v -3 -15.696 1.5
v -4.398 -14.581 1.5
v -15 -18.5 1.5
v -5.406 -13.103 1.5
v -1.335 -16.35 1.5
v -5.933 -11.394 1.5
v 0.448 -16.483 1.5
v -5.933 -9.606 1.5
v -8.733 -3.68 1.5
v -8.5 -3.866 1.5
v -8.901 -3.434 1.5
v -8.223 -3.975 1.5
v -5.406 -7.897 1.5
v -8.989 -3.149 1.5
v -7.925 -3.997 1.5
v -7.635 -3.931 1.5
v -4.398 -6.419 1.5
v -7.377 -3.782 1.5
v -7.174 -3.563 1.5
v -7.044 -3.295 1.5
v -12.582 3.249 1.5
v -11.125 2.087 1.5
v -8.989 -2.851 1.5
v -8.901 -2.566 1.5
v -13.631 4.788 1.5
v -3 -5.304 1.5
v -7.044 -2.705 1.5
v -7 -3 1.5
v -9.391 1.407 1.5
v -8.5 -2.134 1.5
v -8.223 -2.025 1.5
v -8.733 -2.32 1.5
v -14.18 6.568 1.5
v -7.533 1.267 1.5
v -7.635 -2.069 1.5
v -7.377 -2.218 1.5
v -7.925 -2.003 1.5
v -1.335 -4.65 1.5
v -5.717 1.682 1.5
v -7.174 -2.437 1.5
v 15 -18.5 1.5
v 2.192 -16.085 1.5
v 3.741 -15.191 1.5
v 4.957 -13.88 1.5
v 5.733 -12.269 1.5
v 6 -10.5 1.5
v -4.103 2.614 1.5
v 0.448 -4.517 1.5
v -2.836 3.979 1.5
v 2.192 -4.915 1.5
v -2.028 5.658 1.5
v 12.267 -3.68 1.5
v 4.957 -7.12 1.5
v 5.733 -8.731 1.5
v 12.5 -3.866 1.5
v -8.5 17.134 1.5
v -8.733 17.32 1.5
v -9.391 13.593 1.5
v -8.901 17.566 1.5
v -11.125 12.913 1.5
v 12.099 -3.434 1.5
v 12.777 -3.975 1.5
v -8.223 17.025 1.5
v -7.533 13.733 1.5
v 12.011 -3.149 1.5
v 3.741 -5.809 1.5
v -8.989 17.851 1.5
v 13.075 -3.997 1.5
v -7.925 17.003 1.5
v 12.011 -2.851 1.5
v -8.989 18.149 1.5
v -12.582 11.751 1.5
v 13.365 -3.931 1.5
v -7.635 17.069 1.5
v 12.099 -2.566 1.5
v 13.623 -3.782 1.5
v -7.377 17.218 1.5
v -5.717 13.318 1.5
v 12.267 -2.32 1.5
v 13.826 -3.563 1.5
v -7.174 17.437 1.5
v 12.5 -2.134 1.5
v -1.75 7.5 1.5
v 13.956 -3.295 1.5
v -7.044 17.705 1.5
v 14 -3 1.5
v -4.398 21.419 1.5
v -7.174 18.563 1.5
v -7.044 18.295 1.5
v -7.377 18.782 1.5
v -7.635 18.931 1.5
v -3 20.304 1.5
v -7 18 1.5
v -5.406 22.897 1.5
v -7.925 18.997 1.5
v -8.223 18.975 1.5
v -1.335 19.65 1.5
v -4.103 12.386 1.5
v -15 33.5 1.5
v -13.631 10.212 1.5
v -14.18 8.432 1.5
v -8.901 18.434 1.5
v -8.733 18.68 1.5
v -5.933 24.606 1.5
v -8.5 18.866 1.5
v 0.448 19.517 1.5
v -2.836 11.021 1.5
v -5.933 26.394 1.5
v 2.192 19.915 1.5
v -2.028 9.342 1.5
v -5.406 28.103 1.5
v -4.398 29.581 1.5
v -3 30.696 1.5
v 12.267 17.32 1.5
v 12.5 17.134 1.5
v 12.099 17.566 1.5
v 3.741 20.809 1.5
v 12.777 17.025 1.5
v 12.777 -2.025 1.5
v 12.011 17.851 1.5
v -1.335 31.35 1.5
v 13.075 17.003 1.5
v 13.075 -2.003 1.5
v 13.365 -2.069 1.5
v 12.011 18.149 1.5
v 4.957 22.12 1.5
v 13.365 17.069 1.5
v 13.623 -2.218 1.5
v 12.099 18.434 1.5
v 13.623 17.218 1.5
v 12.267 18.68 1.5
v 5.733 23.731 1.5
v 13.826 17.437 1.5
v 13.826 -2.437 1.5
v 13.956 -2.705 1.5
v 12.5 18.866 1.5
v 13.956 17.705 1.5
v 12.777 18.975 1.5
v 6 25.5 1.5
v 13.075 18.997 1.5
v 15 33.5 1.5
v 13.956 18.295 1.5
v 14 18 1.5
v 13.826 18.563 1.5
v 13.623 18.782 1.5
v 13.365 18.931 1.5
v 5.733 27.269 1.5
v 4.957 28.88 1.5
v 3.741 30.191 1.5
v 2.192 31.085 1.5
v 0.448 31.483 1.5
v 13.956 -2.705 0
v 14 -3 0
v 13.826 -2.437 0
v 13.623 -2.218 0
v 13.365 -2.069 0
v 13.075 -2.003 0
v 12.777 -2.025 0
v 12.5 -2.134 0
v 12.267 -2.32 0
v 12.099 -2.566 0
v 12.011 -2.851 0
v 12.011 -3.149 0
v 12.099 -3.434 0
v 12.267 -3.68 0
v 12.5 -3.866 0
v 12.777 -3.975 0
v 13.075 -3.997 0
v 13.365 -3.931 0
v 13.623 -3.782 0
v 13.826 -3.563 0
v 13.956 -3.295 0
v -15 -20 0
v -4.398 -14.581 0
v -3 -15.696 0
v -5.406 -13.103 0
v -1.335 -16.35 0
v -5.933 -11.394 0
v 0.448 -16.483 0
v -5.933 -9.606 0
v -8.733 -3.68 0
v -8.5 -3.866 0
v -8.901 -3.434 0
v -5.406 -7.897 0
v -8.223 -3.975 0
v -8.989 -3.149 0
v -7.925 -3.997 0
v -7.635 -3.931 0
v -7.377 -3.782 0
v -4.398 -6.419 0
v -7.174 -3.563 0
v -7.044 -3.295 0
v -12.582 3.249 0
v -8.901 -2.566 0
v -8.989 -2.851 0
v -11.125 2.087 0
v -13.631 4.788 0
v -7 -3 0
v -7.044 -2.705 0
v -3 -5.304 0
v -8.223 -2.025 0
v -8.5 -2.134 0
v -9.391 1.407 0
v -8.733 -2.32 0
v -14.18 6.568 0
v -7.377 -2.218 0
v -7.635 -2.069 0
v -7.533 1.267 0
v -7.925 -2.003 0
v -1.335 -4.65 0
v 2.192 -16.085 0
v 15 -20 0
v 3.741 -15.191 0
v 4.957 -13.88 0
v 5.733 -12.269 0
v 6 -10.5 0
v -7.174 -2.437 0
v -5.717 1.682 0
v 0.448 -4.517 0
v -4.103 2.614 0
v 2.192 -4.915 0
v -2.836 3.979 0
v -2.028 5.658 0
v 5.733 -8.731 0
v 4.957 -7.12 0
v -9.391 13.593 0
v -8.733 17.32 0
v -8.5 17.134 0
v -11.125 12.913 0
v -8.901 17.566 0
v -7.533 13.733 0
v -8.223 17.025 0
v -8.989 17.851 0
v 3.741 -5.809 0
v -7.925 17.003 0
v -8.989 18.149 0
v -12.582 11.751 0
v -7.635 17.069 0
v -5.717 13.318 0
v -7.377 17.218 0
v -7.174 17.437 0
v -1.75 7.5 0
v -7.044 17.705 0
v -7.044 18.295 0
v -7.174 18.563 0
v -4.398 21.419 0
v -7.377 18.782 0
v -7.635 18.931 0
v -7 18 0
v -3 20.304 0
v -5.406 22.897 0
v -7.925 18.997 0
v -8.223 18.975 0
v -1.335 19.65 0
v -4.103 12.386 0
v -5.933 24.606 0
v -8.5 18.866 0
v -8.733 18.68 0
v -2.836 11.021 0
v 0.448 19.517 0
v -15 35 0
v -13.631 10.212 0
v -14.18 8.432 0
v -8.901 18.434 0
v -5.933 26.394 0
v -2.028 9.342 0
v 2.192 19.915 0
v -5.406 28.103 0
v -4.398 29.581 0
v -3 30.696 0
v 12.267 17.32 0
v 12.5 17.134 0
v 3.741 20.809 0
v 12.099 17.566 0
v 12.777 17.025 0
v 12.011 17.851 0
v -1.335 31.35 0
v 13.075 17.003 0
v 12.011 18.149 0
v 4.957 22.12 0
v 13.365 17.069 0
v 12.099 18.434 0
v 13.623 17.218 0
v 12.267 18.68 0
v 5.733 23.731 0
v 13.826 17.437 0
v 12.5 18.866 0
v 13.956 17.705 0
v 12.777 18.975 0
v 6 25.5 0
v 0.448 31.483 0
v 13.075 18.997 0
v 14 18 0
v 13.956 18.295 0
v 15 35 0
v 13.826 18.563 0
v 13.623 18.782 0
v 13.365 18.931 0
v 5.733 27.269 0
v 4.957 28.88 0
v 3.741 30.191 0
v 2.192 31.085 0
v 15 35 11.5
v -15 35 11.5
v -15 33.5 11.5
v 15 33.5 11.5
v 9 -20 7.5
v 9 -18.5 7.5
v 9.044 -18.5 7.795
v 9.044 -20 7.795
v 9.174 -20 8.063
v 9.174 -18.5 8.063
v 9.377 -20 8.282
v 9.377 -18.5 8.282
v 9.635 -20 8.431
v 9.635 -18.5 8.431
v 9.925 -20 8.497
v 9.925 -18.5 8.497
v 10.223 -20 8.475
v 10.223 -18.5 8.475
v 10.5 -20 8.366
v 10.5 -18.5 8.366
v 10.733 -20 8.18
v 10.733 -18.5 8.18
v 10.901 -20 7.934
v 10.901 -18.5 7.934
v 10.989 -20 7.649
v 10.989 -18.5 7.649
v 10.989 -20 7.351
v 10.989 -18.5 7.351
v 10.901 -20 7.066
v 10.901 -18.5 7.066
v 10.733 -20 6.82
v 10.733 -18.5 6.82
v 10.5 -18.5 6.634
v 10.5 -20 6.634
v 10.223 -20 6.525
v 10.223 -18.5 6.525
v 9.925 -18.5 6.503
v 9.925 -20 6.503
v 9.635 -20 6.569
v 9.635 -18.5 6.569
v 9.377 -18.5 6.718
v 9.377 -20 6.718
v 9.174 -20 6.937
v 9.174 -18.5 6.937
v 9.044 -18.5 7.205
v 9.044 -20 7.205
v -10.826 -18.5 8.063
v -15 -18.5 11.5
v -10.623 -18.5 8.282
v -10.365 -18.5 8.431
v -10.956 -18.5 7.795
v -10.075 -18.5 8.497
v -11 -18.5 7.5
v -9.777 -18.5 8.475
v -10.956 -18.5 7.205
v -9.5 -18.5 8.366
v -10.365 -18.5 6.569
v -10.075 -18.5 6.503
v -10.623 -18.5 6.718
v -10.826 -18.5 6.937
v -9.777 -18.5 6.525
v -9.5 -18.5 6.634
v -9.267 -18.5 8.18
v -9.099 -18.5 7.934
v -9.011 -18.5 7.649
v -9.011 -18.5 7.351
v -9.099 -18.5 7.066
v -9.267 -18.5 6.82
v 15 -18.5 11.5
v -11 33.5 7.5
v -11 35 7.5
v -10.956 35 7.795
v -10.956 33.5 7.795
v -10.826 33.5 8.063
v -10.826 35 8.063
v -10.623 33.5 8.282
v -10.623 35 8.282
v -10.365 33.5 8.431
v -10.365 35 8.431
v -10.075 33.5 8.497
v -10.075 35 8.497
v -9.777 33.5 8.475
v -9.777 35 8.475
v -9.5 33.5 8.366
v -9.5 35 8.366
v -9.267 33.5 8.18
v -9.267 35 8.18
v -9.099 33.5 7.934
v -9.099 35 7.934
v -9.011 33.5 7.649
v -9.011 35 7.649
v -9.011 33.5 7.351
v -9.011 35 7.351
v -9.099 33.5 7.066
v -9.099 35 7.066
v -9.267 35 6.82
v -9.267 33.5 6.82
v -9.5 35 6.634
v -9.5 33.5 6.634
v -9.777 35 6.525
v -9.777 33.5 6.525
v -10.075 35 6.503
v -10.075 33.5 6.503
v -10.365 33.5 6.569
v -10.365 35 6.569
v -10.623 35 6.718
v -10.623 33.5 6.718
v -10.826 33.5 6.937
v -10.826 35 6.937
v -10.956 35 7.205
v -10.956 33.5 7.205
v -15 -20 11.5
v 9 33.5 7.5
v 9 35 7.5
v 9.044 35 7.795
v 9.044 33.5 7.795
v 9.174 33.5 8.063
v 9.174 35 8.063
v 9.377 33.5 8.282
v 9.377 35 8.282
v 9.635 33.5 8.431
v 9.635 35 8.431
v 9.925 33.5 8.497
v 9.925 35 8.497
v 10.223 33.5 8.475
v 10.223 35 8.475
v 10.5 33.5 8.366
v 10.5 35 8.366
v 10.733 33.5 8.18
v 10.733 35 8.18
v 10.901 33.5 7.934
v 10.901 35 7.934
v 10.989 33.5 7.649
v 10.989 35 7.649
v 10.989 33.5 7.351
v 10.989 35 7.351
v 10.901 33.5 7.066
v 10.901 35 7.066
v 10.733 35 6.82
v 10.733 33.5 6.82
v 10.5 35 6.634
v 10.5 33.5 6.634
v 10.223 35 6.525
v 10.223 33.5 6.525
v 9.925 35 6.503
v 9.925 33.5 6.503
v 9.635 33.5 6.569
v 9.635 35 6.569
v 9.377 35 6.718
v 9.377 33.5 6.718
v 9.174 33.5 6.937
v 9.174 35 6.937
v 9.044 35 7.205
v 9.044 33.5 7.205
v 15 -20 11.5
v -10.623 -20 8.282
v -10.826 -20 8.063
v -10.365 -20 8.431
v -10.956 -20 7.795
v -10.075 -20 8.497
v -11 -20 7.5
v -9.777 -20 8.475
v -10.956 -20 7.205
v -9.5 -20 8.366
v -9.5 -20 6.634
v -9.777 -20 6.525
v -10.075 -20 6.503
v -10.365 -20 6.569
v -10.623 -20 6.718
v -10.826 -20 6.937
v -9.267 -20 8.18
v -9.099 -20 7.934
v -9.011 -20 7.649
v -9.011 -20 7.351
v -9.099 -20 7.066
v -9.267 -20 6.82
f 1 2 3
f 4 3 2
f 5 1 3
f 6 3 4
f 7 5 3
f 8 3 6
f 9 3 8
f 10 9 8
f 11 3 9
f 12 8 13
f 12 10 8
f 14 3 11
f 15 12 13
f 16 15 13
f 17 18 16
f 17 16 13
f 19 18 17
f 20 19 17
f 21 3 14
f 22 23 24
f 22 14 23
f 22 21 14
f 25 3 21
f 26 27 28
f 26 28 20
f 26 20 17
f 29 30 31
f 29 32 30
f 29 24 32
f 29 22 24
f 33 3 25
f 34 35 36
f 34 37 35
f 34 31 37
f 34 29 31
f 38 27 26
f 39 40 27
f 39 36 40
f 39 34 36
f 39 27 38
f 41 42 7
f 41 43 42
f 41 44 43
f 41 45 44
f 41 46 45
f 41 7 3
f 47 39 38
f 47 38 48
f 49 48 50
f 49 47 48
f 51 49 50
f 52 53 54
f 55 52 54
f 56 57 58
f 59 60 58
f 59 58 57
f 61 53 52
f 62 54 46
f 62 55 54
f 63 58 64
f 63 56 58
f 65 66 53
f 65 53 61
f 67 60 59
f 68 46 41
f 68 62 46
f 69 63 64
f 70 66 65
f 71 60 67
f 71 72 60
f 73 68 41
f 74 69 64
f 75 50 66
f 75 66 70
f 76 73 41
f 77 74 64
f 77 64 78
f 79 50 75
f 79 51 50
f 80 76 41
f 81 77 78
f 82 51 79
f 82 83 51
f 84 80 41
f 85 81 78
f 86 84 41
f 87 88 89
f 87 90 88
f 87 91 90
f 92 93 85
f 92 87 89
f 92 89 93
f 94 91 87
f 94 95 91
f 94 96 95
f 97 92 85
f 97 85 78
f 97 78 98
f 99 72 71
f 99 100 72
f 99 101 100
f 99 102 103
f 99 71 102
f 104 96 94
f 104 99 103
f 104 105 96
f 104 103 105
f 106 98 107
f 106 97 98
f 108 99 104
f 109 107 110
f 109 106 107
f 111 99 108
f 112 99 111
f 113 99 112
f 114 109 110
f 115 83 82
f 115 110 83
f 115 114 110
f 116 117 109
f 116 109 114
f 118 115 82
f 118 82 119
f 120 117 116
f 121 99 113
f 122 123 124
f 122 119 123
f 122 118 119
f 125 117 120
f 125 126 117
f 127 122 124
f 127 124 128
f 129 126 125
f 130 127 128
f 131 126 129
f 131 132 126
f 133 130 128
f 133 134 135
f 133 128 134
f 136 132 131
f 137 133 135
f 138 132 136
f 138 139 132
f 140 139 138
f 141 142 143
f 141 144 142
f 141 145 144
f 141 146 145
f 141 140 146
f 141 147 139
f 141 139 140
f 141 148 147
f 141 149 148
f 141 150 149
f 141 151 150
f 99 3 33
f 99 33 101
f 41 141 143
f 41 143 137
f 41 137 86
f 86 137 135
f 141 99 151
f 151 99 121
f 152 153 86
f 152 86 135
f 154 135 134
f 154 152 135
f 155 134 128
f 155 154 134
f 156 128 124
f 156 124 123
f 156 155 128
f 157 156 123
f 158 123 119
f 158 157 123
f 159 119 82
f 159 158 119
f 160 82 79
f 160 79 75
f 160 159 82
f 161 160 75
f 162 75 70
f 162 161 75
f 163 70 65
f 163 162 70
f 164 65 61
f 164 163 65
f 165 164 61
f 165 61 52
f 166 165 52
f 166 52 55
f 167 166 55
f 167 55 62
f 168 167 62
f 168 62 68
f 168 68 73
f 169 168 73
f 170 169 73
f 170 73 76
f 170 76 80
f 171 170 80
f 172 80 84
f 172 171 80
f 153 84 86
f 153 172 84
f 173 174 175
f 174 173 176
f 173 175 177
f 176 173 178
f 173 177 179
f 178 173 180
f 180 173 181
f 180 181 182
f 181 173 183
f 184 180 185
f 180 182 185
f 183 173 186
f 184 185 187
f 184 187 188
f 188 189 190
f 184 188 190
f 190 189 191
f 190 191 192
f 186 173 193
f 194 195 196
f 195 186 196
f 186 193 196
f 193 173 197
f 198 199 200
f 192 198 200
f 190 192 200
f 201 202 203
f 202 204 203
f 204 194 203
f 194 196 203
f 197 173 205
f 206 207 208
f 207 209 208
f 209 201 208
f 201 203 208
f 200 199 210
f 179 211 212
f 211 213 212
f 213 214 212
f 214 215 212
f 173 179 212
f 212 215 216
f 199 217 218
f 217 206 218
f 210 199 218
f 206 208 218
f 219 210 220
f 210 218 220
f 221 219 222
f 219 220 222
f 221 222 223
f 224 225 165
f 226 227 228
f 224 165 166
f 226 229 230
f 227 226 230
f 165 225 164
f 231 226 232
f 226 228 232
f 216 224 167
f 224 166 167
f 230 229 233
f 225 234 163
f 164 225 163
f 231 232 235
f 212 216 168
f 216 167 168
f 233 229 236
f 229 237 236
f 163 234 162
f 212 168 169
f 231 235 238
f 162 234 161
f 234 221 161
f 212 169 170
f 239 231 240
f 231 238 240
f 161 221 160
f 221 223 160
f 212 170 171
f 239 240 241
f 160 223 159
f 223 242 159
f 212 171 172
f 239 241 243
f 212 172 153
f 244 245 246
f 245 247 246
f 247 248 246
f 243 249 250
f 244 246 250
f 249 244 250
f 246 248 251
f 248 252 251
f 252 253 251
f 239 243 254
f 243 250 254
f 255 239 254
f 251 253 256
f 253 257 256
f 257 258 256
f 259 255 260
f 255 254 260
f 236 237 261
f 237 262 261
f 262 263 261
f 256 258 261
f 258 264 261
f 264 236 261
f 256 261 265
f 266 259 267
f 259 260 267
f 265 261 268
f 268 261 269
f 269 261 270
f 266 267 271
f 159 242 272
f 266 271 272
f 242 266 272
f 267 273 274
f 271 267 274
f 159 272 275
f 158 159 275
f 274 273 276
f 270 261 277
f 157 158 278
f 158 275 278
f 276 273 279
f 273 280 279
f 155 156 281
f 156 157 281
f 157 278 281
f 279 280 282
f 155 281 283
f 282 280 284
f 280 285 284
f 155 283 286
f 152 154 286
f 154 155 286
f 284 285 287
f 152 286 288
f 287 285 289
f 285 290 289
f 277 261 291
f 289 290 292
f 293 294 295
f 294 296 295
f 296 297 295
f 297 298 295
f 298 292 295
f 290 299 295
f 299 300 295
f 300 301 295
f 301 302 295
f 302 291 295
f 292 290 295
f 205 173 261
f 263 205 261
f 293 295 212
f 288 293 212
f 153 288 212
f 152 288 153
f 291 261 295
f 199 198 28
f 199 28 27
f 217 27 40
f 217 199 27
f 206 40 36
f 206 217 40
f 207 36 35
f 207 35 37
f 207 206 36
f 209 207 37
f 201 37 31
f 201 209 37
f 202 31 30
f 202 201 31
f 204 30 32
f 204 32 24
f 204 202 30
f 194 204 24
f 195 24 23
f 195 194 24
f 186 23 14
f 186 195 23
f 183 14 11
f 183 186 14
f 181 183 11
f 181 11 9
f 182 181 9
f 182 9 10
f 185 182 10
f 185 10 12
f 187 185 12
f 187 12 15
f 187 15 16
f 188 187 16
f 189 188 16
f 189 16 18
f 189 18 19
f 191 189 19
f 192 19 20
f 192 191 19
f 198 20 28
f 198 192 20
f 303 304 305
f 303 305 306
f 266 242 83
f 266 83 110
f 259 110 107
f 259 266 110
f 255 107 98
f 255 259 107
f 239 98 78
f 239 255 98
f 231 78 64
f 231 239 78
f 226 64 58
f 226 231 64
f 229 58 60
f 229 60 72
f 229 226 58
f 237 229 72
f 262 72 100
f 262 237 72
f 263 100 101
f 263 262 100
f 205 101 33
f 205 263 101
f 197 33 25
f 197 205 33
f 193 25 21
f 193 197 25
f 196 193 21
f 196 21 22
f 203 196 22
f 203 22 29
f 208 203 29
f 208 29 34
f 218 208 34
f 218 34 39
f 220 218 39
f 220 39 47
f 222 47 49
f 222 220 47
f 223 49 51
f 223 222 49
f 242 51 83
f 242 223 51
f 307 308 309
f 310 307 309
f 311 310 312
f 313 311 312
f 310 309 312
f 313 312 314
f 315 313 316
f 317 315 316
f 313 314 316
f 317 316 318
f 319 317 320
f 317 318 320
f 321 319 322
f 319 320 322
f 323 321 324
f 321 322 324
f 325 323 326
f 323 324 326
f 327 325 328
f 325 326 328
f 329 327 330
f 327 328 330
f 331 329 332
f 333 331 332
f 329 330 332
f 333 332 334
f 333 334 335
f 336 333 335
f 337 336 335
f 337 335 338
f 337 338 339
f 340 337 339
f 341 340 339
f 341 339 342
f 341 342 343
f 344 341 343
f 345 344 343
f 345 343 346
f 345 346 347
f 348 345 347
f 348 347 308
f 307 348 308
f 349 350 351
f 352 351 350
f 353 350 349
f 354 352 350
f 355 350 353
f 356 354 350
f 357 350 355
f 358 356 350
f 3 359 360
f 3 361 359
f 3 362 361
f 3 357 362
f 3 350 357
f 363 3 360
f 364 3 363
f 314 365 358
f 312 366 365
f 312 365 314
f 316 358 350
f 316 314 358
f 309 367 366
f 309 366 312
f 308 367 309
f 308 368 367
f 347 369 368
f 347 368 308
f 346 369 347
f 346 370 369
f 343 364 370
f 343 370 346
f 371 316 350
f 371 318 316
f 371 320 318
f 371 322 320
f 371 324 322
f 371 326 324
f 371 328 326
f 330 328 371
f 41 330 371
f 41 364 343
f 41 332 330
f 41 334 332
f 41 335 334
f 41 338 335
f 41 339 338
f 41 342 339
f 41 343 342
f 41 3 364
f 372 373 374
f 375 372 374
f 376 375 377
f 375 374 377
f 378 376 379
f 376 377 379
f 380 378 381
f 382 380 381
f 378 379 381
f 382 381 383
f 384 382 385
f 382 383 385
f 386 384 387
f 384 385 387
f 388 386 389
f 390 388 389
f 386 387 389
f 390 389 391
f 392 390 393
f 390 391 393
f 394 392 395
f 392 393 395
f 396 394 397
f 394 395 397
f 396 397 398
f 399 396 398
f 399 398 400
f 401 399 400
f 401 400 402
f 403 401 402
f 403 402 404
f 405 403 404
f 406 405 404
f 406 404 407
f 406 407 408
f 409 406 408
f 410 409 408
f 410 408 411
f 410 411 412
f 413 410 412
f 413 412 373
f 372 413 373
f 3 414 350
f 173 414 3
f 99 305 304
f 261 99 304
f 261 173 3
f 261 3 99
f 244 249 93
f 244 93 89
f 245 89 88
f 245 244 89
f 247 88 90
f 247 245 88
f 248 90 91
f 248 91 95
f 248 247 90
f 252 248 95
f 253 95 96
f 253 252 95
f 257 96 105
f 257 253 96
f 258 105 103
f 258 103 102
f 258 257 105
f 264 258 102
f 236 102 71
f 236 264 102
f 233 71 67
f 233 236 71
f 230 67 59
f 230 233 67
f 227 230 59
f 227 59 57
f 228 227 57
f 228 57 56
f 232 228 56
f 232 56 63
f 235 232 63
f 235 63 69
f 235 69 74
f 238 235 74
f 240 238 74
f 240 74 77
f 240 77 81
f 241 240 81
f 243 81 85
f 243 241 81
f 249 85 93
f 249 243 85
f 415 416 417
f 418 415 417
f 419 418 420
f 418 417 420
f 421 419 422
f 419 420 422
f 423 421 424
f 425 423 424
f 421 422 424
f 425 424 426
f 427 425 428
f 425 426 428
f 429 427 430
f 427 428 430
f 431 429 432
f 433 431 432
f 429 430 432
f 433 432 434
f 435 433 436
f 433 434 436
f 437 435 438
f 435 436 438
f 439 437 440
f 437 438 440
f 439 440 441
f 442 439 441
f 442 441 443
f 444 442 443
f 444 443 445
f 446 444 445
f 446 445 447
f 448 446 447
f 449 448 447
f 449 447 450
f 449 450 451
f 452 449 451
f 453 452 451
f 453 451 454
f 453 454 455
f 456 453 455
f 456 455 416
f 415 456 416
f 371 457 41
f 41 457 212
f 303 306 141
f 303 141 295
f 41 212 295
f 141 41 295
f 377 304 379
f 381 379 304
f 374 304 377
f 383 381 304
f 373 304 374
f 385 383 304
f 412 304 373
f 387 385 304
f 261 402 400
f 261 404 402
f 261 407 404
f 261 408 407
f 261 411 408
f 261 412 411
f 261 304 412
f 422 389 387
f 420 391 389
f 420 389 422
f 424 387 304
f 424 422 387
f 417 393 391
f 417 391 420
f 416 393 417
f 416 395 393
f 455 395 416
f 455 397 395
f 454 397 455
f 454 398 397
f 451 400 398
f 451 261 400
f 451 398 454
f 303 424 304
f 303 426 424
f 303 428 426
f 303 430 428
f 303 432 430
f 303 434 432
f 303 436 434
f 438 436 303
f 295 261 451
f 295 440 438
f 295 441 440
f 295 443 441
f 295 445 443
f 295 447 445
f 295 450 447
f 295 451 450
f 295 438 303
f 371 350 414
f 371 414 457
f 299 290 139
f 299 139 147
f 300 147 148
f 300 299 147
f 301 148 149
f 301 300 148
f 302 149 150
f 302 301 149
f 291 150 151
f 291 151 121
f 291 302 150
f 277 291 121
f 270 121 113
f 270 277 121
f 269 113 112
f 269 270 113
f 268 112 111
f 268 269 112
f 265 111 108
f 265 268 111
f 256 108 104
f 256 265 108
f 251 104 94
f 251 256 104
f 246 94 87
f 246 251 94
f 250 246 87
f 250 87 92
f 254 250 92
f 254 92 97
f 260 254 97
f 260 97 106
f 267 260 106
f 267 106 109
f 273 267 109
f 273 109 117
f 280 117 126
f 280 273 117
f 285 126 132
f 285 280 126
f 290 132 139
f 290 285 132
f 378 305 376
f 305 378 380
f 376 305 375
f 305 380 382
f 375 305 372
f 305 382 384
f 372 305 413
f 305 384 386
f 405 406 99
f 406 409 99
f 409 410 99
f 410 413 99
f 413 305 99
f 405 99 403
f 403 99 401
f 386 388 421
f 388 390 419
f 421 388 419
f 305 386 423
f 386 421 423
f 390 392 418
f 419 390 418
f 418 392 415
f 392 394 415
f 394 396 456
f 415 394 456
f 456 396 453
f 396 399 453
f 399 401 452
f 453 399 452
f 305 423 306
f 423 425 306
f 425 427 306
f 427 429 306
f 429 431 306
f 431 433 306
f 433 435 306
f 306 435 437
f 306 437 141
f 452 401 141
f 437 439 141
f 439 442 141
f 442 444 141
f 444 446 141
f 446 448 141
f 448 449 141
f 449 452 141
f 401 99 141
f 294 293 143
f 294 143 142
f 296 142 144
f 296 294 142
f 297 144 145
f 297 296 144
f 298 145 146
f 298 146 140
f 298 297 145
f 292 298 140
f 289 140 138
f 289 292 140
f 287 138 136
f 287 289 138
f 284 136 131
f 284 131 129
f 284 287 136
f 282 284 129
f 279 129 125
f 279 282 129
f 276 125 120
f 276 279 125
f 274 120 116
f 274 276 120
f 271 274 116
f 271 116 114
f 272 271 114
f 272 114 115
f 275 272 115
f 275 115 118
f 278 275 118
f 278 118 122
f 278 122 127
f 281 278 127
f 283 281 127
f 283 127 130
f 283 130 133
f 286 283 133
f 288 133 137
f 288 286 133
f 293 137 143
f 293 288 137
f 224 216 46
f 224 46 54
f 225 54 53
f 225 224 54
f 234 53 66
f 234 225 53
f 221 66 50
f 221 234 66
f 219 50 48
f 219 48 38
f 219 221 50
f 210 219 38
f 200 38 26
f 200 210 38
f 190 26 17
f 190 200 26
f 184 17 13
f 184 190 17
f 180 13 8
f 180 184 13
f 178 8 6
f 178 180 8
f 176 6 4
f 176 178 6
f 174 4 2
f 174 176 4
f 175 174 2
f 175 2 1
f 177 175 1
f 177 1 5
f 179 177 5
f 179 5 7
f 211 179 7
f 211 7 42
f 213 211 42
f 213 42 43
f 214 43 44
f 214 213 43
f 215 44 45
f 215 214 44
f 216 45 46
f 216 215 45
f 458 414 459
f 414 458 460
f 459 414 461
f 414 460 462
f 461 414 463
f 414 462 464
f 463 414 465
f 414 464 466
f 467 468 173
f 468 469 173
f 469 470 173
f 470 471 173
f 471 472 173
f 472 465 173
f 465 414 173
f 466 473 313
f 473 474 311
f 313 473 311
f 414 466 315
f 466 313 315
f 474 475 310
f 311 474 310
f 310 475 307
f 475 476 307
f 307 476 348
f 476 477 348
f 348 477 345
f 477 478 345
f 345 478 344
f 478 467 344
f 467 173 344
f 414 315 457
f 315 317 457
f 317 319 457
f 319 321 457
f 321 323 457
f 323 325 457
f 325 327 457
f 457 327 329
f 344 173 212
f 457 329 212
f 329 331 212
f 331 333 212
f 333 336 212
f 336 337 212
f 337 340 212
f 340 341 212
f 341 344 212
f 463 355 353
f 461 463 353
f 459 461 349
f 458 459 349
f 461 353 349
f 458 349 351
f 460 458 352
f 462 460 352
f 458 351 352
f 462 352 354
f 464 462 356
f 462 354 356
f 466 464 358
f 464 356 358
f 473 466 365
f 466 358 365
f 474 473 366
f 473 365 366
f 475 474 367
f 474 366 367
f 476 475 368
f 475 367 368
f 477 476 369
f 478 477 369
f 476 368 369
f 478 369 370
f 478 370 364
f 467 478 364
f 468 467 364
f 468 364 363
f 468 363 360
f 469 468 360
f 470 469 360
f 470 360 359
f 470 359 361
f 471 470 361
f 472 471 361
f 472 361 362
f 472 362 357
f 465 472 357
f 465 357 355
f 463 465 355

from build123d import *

# Parameters (mm, degrees)
F0_W     = 30
F0_H     = 55
F0_R     = 1
F0_R_2   = 6
F0_R_3   = 6.25
F1_DEPTH = 1.5
F2_W     = 30
F2_H     = 1.5
F3_DEPTH = 10
F4_R     = 1
F5_DEPTH = 55.001


with BuildPart() as f1:
    # F0 (on Top) → F1 (new body)
    with BuildSketch(Plane.XY):
        with Locations((0, 7.5)):
            Rectangle(F0_W, F0_H)
        with Locations((-8, -3)):
            Circle(F0_R, mode=Mode.SUBTRACT)
        with Locations((0, -10.5)):
            Circle(F0_R_2, mode=Mode.SUBTRACT)
        with Locations((13, -3)):
            Circle(F0_R, mode=Mode.SUBTRACT)
        with Locations((-8, 7.5)):
            Circle(F0_R_3, mode=Mode.SUBTRACT)
        with Locations((-8, 18)):
            Circle(F0_R, mode=Mode.SUBTRACT)
        with Locations((13, 18)):
            Circle(F0_R, mode=Mode.SUBTRACT)
        with Locations((0, 25.5)):
            Circle(F0_R_2, mode=Mode.SUBTRACT)
    extrude(amount=F1_DEPTH)

    # F2 (on face) → F3 (join)
    with BuildSketch(Plane.XY.offset(1.5)):
        with Locations((0, 34.25)):
            Rectangle(F2_W, F2_H)
        with Locations((0, -19.25)):
            Rectangle(F2_W, F2_H)
    extrude(amount=F3_DEPTH)

    # F4 (on face) → F5 (cut, through all)
    with BuildSketch(Plane(origin=(0, 35, 0), x_dir=(-1, 0, 0), z_dir=(0, 1, 0))):
        with Locations((-10, 7.5)):
            Circle(F4_R)
        with Locations((10, 7.5)):
            Circle(F4_R)
    extrude(amount=-F5_DEPTH, mode=Mode.SUBTRACT)


solid = f1.part
